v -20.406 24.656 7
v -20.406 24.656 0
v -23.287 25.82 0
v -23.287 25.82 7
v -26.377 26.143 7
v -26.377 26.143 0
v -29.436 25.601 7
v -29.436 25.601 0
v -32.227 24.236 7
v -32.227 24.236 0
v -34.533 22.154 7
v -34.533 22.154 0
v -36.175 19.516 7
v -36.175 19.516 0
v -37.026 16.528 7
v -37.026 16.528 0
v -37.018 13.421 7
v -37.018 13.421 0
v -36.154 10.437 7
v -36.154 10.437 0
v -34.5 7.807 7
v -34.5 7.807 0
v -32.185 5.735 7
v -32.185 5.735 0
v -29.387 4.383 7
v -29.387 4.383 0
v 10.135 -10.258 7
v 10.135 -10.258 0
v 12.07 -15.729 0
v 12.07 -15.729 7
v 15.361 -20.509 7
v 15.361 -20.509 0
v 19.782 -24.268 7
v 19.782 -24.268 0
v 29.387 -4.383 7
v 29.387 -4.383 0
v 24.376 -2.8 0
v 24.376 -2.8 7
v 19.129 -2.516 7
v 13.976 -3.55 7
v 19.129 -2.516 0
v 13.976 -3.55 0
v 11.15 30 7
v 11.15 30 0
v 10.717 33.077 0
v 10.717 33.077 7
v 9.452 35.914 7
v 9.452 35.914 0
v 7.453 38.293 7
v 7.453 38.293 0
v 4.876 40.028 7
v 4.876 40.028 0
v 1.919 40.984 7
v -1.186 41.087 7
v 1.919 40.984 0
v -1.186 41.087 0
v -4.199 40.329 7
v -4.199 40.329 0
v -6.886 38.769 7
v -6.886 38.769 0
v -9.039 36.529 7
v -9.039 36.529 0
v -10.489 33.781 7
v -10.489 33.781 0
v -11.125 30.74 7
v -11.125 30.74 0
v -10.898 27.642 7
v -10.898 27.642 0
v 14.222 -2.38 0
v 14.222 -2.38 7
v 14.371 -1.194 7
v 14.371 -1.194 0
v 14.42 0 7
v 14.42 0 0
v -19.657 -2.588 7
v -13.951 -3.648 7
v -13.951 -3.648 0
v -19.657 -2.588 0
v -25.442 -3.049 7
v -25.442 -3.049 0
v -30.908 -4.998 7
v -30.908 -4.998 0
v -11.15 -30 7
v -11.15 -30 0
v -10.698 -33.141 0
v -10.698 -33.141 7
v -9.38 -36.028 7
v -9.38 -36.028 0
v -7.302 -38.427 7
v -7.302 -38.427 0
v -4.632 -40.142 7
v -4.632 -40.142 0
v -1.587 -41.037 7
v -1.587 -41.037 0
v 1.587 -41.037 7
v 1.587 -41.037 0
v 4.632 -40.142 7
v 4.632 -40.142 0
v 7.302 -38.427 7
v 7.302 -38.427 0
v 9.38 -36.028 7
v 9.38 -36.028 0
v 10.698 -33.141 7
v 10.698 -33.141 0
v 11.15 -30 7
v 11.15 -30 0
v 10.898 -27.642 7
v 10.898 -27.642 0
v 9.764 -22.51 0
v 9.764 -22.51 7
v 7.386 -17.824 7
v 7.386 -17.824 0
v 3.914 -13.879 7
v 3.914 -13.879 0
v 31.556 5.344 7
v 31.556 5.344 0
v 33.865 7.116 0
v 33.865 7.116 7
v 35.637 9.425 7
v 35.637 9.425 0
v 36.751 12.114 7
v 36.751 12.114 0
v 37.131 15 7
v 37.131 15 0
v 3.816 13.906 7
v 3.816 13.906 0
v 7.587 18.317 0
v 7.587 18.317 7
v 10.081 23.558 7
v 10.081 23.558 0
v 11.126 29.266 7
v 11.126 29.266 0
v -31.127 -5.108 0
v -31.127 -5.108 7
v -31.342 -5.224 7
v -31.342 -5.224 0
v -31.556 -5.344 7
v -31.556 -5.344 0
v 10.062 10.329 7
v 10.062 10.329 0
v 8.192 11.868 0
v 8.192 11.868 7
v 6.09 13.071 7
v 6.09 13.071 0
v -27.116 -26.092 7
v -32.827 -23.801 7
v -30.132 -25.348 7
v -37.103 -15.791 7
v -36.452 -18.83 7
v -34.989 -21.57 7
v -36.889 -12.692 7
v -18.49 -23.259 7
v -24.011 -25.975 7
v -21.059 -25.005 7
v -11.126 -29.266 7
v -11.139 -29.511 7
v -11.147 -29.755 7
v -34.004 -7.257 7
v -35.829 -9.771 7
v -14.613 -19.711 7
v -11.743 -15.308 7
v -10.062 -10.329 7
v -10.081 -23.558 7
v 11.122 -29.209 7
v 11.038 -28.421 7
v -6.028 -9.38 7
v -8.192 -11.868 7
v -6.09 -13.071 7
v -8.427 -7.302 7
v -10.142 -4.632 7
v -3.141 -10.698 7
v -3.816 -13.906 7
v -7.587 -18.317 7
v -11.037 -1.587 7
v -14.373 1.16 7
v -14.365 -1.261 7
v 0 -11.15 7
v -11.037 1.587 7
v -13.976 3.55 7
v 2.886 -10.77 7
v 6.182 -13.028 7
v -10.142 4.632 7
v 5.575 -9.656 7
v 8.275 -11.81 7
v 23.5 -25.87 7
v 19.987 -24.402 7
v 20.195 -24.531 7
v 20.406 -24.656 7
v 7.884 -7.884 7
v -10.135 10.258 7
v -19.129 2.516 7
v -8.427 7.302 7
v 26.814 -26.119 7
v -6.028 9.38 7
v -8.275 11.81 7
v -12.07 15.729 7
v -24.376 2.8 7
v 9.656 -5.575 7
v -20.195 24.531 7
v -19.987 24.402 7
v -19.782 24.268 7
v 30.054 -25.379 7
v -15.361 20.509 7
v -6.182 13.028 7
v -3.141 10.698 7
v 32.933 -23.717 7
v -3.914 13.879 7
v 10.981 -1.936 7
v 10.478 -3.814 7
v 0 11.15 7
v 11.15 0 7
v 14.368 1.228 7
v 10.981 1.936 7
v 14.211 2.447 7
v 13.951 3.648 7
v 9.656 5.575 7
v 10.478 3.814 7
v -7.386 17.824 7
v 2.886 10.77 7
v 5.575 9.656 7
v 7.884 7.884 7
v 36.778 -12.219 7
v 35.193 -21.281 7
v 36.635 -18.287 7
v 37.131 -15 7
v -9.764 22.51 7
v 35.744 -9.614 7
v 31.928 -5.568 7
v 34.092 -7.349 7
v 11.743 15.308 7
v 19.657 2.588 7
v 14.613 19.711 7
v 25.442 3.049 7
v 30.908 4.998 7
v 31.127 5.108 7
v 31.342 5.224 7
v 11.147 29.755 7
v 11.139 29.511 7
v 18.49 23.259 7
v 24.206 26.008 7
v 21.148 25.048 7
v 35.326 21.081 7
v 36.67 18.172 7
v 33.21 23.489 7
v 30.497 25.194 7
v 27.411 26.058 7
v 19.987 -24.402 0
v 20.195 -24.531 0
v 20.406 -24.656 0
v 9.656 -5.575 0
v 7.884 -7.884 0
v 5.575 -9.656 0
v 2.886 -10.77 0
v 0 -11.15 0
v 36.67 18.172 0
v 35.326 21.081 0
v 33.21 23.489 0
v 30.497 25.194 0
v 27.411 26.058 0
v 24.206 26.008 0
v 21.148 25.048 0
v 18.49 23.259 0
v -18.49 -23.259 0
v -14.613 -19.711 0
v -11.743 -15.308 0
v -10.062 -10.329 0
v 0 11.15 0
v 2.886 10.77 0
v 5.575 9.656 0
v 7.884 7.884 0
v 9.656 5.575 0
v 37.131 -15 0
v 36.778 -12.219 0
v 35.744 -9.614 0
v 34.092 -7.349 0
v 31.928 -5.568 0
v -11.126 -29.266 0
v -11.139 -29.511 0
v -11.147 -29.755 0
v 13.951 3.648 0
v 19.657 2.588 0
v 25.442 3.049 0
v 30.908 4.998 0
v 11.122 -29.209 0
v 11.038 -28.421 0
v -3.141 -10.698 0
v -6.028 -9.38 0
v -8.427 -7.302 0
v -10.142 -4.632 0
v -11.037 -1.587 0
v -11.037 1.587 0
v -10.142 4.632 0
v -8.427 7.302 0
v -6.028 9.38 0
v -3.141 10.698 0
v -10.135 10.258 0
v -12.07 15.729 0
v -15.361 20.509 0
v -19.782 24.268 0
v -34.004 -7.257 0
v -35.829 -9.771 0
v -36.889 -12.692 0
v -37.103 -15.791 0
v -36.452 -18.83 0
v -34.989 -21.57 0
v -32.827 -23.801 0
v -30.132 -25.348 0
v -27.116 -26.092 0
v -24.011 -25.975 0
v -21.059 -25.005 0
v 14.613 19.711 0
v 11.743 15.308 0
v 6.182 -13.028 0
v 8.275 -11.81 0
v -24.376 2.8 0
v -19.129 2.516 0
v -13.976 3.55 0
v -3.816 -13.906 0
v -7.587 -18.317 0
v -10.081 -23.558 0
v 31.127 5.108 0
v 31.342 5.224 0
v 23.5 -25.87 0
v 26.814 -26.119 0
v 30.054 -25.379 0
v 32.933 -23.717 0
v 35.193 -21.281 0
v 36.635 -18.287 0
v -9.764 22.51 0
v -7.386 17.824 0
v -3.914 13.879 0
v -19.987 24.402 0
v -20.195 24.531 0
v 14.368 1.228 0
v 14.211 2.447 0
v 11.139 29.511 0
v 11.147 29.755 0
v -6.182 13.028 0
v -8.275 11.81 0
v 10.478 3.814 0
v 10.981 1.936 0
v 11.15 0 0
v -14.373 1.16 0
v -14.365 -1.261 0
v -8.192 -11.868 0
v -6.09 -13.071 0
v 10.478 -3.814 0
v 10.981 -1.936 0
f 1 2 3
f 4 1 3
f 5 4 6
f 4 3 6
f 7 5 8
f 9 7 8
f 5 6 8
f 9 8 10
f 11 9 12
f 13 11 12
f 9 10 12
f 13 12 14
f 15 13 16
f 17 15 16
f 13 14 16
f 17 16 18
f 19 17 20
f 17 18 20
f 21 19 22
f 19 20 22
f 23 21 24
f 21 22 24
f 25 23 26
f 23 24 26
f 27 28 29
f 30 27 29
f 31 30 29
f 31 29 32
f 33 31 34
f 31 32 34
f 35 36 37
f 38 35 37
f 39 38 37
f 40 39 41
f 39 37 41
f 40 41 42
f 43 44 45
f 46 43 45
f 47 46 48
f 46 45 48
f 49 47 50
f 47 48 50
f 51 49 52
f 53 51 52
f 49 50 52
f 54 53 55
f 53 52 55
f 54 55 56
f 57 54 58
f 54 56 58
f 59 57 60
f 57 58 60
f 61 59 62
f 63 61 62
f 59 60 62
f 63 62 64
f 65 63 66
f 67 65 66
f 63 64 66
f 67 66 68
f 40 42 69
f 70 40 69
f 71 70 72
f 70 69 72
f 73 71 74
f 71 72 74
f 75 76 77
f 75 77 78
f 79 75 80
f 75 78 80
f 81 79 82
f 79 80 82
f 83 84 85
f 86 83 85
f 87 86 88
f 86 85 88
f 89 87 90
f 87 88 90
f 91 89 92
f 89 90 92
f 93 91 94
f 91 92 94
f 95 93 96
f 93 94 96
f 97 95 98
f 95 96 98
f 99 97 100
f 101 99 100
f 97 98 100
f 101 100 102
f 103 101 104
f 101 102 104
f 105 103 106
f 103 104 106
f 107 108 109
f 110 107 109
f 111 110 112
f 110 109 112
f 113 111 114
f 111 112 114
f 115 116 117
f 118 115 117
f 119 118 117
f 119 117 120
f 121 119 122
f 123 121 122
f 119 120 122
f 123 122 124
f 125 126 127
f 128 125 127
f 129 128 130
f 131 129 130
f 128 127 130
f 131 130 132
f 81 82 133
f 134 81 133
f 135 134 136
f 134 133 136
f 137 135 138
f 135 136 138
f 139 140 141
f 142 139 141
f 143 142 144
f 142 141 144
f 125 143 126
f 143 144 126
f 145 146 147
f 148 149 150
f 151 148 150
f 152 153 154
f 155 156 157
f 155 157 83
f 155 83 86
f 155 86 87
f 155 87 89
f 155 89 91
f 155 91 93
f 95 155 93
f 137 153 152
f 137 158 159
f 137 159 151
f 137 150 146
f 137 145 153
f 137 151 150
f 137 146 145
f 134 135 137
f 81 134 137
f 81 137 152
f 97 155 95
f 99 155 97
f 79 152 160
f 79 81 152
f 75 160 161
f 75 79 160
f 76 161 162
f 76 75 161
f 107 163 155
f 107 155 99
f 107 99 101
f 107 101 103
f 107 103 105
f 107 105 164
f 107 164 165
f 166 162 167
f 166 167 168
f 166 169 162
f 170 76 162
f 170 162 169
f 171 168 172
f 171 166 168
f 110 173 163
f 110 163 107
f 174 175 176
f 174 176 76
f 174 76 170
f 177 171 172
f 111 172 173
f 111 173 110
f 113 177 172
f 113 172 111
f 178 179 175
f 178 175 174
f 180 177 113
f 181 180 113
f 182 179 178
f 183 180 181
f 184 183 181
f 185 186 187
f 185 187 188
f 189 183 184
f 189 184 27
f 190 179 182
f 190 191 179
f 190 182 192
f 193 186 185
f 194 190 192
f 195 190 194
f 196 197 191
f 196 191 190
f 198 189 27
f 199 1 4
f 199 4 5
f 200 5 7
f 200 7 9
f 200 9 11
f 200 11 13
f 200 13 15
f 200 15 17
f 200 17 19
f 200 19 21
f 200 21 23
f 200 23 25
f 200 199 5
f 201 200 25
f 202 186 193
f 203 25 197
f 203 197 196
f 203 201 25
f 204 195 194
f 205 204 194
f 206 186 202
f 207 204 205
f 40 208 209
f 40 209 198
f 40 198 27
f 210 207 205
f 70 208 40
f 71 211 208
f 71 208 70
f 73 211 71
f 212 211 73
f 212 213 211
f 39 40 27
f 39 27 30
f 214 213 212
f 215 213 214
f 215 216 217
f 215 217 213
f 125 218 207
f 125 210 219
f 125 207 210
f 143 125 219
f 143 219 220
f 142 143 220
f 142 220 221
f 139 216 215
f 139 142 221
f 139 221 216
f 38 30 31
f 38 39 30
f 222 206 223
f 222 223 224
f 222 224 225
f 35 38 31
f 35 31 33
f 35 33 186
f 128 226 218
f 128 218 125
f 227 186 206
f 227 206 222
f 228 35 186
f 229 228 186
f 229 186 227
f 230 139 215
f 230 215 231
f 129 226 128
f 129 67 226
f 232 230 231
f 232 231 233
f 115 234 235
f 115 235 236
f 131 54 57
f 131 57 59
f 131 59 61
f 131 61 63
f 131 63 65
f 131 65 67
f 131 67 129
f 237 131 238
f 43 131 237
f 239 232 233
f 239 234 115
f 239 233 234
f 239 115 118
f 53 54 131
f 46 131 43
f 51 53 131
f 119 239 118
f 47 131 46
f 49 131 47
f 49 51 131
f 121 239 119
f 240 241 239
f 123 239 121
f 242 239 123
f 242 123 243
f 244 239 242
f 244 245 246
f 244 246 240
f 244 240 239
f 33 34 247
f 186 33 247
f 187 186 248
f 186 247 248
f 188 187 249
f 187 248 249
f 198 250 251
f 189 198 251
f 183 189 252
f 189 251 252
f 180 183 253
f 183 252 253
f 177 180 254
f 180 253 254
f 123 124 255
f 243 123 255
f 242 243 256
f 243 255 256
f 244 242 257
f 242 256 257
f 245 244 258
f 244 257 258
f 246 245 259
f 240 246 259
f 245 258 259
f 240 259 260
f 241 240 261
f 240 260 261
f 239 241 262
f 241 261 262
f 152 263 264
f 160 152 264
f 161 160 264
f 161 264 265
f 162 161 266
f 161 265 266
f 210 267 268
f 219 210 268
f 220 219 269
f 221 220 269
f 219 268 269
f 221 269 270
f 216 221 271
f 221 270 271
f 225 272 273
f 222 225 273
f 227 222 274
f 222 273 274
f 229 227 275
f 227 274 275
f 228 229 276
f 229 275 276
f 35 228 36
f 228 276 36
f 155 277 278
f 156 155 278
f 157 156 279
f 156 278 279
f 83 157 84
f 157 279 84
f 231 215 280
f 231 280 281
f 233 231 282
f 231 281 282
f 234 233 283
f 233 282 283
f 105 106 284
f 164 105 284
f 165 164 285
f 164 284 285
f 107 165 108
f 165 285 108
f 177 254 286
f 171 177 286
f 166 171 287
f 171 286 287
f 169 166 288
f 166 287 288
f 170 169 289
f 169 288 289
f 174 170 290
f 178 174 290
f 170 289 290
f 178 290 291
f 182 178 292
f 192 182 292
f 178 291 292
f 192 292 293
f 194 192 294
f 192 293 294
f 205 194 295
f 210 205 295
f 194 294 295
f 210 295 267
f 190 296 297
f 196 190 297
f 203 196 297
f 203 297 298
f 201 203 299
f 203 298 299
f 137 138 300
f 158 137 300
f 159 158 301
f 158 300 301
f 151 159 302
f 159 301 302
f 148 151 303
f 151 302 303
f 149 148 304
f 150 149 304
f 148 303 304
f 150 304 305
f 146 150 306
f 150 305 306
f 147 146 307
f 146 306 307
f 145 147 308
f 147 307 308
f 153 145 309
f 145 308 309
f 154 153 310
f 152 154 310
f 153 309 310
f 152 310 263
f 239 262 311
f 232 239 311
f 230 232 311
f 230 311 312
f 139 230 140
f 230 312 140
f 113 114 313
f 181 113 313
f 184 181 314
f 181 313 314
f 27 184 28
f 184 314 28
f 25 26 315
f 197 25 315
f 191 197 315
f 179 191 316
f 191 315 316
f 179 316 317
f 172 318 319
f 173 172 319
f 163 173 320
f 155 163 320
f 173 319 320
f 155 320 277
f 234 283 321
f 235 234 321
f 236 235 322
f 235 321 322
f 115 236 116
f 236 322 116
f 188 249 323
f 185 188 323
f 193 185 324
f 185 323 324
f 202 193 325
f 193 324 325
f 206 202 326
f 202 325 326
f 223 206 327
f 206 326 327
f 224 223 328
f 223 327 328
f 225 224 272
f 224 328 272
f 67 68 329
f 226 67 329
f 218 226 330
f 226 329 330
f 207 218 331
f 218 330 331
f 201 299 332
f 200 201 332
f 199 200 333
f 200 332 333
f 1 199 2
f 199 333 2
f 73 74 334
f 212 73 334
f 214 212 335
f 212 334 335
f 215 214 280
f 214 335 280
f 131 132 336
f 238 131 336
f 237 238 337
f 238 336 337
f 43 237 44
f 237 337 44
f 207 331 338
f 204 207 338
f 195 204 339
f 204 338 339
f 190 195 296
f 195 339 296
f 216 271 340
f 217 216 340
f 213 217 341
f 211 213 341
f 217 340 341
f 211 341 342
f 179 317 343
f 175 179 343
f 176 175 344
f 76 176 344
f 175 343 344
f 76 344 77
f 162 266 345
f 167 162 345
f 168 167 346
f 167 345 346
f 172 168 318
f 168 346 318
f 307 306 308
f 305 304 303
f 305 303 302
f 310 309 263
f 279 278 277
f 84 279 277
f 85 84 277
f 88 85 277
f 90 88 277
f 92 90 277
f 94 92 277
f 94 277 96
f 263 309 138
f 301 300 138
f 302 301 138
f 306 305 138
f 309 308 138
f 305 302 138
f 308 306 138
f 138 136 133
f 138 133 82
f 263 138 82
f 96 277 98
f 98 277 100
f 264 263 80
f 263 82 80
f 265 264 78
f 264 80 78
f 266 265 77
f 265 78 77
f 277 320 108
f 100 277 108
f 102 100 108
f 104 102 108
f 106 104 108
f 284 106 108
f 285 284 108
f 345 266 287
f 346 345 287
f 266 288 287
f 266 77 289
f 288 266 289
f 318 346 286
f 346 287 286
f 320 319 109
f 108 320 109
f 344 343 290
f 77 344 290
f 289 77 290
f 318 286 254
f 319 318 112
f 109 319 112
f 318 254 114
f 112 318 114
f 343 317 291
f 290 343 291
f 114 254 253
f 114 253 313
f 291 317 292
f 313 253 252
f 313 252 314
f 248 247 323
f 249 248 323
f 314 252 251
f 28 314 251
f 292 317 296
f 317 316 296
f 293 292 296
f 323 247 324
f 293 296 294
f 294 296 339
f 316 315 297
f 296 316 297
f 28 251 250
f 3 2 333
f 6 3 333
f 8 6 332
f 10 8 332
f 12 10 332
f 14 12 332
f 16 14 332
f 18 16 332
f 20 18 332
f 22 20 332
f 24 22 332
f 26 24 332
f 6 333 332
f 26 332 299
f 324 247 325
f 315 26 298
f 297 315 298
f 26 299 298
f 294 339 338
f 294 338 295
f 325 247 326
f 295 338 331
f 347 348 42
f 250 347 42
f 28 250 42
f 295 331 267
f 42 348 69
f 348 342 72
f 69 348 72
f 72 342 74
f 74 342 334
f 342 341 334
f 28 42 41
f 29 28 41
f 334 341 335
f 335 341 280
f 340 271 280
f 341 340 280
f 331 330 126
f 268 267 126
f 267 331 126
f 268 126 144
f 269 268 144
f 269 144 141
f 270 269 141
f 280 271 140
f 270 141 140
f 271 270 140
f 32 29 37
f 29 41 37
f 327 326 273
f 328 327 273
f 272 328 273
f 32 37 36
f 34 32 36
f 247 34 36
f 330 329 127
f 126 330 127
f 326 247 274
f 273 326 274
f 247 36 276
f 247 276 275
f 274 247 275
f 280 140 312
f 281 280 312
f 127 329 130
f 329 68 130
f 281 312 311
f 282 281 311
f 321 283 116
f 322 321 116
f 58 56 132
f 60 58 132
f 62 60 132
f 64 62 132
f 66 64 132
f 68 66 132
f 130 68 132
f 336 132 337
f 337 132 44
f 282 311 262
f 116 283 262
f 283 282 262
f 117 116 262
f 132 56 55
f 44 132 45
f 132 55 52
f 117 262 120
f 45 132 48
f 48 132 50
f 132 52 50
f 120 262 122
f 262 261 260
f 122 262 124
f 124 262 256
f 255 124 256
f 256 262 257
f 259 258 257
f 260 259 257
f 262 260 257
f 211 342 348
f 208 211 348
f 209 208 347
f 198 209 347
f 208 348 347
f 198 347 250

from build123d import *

# Parameters (mm, degrees)
F1_DEPTH = 7


with BuildPart() as f1:
    # F0 (on Top) → F1 (new body)
    with BuildSketch(Plane.XY):
        with BuildLine():
            ThreePointArc((9.6561832522, 5.575), (10.7700729631, 2.8858323529), (11.15, 0))
            ThreePointArc((11.15, 0), (10.7700729631, -2.8858323529), (9.6561832522, -5.575))
            ThreePointArc((9.6561832522, -5.575), (11.7583450993, -4.4386309052), (13.9764549062, -3.549581955))
            ThreePointArc((13.9764549062, -3.549581955), (14.308798821, -1.7886028346), (14.4201533903, 0))
            ThreePointArc((14.4201533903, 0), (14.3024193489, 1.8389194019), (13.9511397154, 3.6478109107))
            ThreePointArc((13.9511397154, 3.6478109107), (11.7522539794, 4.4968380812), (9.6561832522, 5.575))
        make_face()
        with BuildLine():
            ThreePointArc((10.0622555989, 10.3291740261), (9.7231396716, 7.9637101099), (9.6561832522, 5.575))
            ThreePointArc((9.6561832522, 5.575), (11.7522539794, 4.4968380812), (13.9511397154, 3.6478109107))
            ThreePointArc((13.9511397154, 3.6478109107), (12.4627822697, 7.2539562928), (10.0622555989, 10.3291740261))
        make_face()
        with BuildLine():
            ThreePointArc((0, 11.15), (5.575, 9.6561832522), (9.6561832522, 5.575))
            ThreePointArc((9.6561832522, 5.575), (9.7231396716, 7.9637101099), (10.0622555989, 10.3291740261))
            ThreePointArc((10.0622555989, 10.3291740261), (7.1661079009, 12.5135015624), (3.8164729409, 13.9059468606))
            ThreePointArc((3.8164729409, 13.9059468606), (1.9817509747, 12.4261695385), (0, 11.15))
        make_face()
        with BuildLine():
            ThreePointArc((10.1346667746, -10.25813595), (9.7705030047, -7.9293314573), (9.6561832522, -5.575))
            ThreePointArc((9.6561832522, -5.575), (5.575, -9.6561832522), (0, -11.15))
            ThreePointArc((0, -11.15), (2.0352054277, -12.4023410151), (3.9141993072, -13.8787559811))
            ThreePointArc((3.9141993072, -13.8787559811), (7.2539562928, -12.4627822697), (10.1346667746, -10.25813595))
        make_face()
        with BuildLine():
            ThreePointArc((13.9764549062, -3.549581955), (11.7583450993, -4.4386309052), (9.6561832522, -5.575))
            ThreePointArc((9.6561832522, -5.575), (9.7705030047, -7.9293314573), (10.1346667746, -10.25813595))
            ThreePointArc((10.1346667746, -10.25813595), (12.5135015624, -7.1661079009), (13.9764549062, -3.549581955))
        make_face()
        with BuildLine():
            ThreePointArc((-3.9141993072, 13.8787559811), (-2.0352054277, 12.4023410151), (0, 11.15))
            ThreePointArc((0, 11.15), (1.9817509747, 12.4261695385), (3.8164729409, 13.9059468606))
            ThreePointArc((3.8164729409, 13.9059468606), (-0.0507192927, 14.4200641938), (-3.9141993072, 13.8787559811))
        make_face()
        with BuildLine():
            ThreePointArc((-9.6561832522, 5.575), (-5.575, 9.6561832522), (0, 11.15))
            ThreePointArc((0, 11.15), (-2.0352054277, 12.4023410151), (-3.9141993072, 13.8787559811))
            ThreePointArc((-3.9141993072, 13.8787559811), (-7.2539562928, 12.4627822697), (-10.1346667746, 10.25813595))
            ThreePointArc((-10.1346667746, 10.25813595), (-9.7705030047, 7.9293314573), (-9.6561832522, 5.575))
        make_face()
        with BuildLine():
            ThreePointArc((10.0622555989, 10.3291740261), (12.4627822697, 7.2539562928), (13.9511397154, 3.6478109107))
            ThreePointArc((13.9511397154, 3.6478109107), (22.5646732179, 2.6278419368), (30.9082990141, 4.9979062145))
            ThreePointArc((30.9082990141, 4.9979062145), (16.7608876912, 8.7297196525), (18.4895315816, 23.2585691931))
            ThreePointArc((18.4895315816, 23.2585691931), (13.039109397, 17.5999976189), (10.0622555989, 10.3291740261))
        make_face()
        with BuildLine():
            ThreePointArc((-3.8164729409, -13.9059468606), (-1.9817509747, -12.4261695385), (0, -11.15))
            ThreePointArc((0, -11.15), (-5.575, -9.6561832522), (-9.6561832522, -5.575))
            ThreePointArc((-9.6561832522, -5.575), (-9.7231396716, -7.9637101099), (-10.0622555989, -10.3291740261))
            ThreePointArc((-10.0622555989, -10.3291740261), (-7.1661079009, -12.5135015624), (-3.8164729409, -13.9059468606))
        make_face()
        with BuildLine():
            ThreePointArc((3.9141993072, -13.8787559811), (2.0352054277, -12.4023410151), (0, -11.15))
            ThreePointArc((0, -11.15), (-1.9817509747, -12.4261695385), (-3.8164729409, -13.9059468606))
            ThreePointArc((-3.8164729409, -13.9059468606), (0.0507192927, -14.4200641938), (3.9141993072, -13.8787559811))
        make_face()
        with BuildLine():
            ThreePointArc((13.9764549062, -3.549581955), (12.5135015624, -7.1661079009), (10.1346667746, -10.25813595))
            ThreePointArc((10.1346667746, -10.25813595), (13.5581144833, -18.2276592665), (19.7824632545, -24.2684190267))
            ThreePointArc((19.7824632545, -24.2684190267), (15.9406028326, -10.1504947043), (29.3872775678, -4.3831194572))
            ThreePointArc((29.3872775678, -4.3831194572), (21.761599743, -2.4922011711), (13.9764549062, -3.549581955))
        make_face()
        with BuildLine():
            ThreePointArc((-13.9764549062, 3.549581955), (-11.7583450993, 4.4386309052), (-9.6561832522, 5.575))
            ThreePointArc((-9.6561832522, 5.575), (-9.7705030047, 7.9293314573), (-10.1346667746, 10.25813595))
            ThreePointArc((-10.1346667746, 10.25813595), (-12.5135015624, 7.1661079009), (-13.9764549062, 3.549581955))
        make_face()
        with BuildLine():
            ThreePointArc((-9.6561832522, -5.575), (-11.15, 0), (-9.6561832522, 5.575))
            ThreePointArc((-9.6561832522, 5.575), (-11.7583450993, 4.4386309052), (-13.9764549062, 3.549581955))
            ThreePointArc((-13.9764549062, 3.549581955), (-14.4200641938, -0.0507192927), (-13.9511397154, -3.6478109107))
            ThreePointArc((-13.9511397154, -3.6478109107), (-11.7522539794, -4.4968380812), (-9.6561832522, -5.575))
        make_face()
        with BuildLine():
            ThreePointArc((-3.9141993072, 13.8787559811), (-0.0507192927, 14.4200641938), (3.8164729409, 13.9059468606))
            ThreePointArc((3.8164729409, 13.9059468606), (9.0065587346, 20.8555012032), (11.1258357595, 29.2663252412))
            ThreePointArc((11.1258357595, 29.2663252412), (0.8202848586, 18.8802143568), (-10.8977459861, 27.6416886503))
            ThreePointArc((-10.8977459861, 27.6416886503), (-8.722490346, 20.0921987899), (-3.9141993072, 13.8787559811))
        make_face()
        with BuildLine():
            ThreePointArc((31.5557621135, 5.3438167478), (31.2334654211, 5.168175766), (30.9082990141, 4.9979062145))
            ThreePointArc((30.9082990141, 4.9979062145), (31.2348780107, 5.1655317307), (31.5557621135, 5.3438167478))
        make_face()
        with BuildLine():
            ThreePointArc((18.4895315816, 23.2585691931), (16.7608876912, 8.7297196525), (30.9082990141, 4.9979062145))
            ThreePointArc((30.9082990141, 4.9979062145), (31.2334654211, 5.168175766), (31.5557621135, 5.3438167478))
            ThreePointArc((31.5557621135, 5.3438167478), (35.6369453657, 9.425), (37.1307621135, 15))
            ThreePointArc((37.1307621135, 15), (30.497136742, 25.1943543305), (18.4895315816, 23.2585691931))
        make_face()
        with BuildLine():
            ThreePointArc((-10.0622555989, -10.3291740261), (-9.7231396716, -7.9637101099), (-9.6561832522, -5.575))
            ThreePointArc((-9.6561832522, -5.575), (-11.7522539794, -4.4968380812), (-13.9511397154, -3.6478109107))
            ThreePointArc((-13.9511397154, -3.6478109107), (-12.4627822697, -7.2539562928), (-10.0622555989, -10.3291740261))
        make_face()
        with BuildLine():
            ThreePointArc((3.9141993072, -13.8787559811), (0.0507192927, -14.4200641938), (-3.8164729409, -13.9059468606))
            ThreePointArc((-3.8164729409, -13.9059468606), (-9.0065587346, -20.8555012032), (-11.1258357595, -29.2663252412))
            ThreePointArc((-11.1258357595, -29.2663252412), (-0.8202848586, -18.8802143568), (10.8977459861, -27.6416886503))
            ThreePointArc((10.8977459861, -27.6416886503), (8.722490346, -20.0921987899), (3.9141993072, -13.8787559811))
        make_face()
        with BuildLine():
            ThreePointArc((20.4057621135, -24.6561832522), (20.0925042151, -24.4648866199), (19.7824632545, -24.2684190267))
            ThreePointArc((19.7824632545, -24.2684190267), (20.0909207082, -24.467431976), (20.4057621135, -24.6561832522))
        make_face()
        with BuildLine():
            ThreePointArc((29.3872775678, -4.3831194572), (15.9406028326, -10.1504947043), (19.7824632545, -24.2684190267))
            ThreePointArc((19.7824632545, -24.2684190267), (20.0925042151, -24.4648866199), (20.4057621135, -24.6561832522))
            ThreePointArc((20.4057621135, -24.6561832522), (31.5557621135, -24.6561832522), (37.1307621135, -15))
            ThreePointArc((37.1307621135, -15), (34.98923444, -8.4296174889), (29.3872775678, -4.3831194572))
        make_face()
        with BuildLine():
            ThreePointArc((-13.9764549062, 3.549581955), (-12.5135015624, 7.1661079009), (-10.1346667746, 10.25813595))
            ThreePointArc((-10.1346667746, 10.25813595), (-13.5581144833, 18.2276592665), (-19.7824632545, 24.2684190267))
            ThreePointArc((-19.7824632545, 24.2684190267), (-16.1462938443, 20.2541158972), (-14.8307621135, 15))
            ThreePointArc((-14.8307621135, 15), (-19.4103796024, 5.9915276735), (-29.3872775678, 4.3831194572))
            ThreePointArc((-29.3872775678, 4.3831194572), (-21.761599743, 2.4922011711), (-13.9764549062, 3.549581955))
        make_face()
        with BuildLine():
            ThreePointArc((11.15, 30), (11.140961206, 29.6330623859), (11.1258357595, 29.2663252412))
            ThreePointArc((11.1258357595, 29.2663252412), (11.1439573025, 29.6329637068), (11.15, 30))
        make_face()
        with BuildLine():
            ThreePointArc((-10.8977459861, 27.6416886503), (0.8202848586, 18.8802143568), (11.1258357595, 29.2663252412))
            ThreePointArc((11.1258357595, 29.2663252412), (11.140961206, 29.6330623859), (11.15, 30))
            ThreePointArc((11.15, 30), (-1.185882004, 41.0867571396), (-10.8977459861, 27.6416886503))
        make_face()
        with BuildLine():
            ThreePointArc((-10.0622555989, -10.3291740261), (-12.4627822697, -7.2539562928), (-13.9511397154, -3.6478109107))
            ThreePointArc((-13.9511397154, -3.6478109107), (-22.5646732179, -2.6278419368), (-30.9082990141, -4.9979062145))
            ThreePointArc((-30.9082990141, -4.9979062145), (-20.0909207082, -5.532568024), (-14.8307621135, -15))
            ThreePointArc((-14.8307621135, -15), (-15.7864077831, -19.5163746285), (-18.4895315816, -23.2585691931))
            ThreePointArc((-18.4895315816, -23.2585691931), (-13.039109397, -17.5999976189), (-10.0622555989, -10.3291740261))
        make_face()
        with BuildLine():
            ThreePointArc((-11.15, -30), (-11.140961206, -29.6330623859), (-11.1258357595, -29.2663252412))
            ThreePointArc((-11.1258357595, -29.2663252412), (-11.1439573025, -29.6329637068), (-11.15, -30))
        make_face()
        with BuildLine():
            ThreePointArc((10.8977459861, -27.6416886503), (-0.8202848586, -18.8802143568), (-11.1258357595, -29.2663252412))
            ThreePointArc((-11.1258357595, -29.2663252412), (-11.140961206, -29.6330623859), (-11.15, -30))
            ThreePointArc((-11.15, -30), (0, -41.15), (11.15, -30))
            ThreePointArc((11.15, -30), (11.0867571396, -28.814117996), (10.8977459861, -27.6416886503))
        make_face()
        with BuildLine():
            ThreePointArc((-20.4057621135, 24.6561832522), (-20.0925042151, 24.4648866199), (-19.7824632545, 24.2684190267))
            ThreePointArc((-19.7824632545, 24.2684190267), (-20.0909207082, 24.467431976), (-20.4057621135, 24.6561832522))
        make_face()
        with BuildLine():
            ThreePointArc((-14.8307621135, 15), (-16.1462938443, 20.2541158972), (-19.7824632545, 24.2684190267))
            ThreePointArc((-19.7824632545, 24.2684190267), (-20.0925042151, 24.4648866199), (-20.4057621135, 24.6561832522))
            ThreePointArc((-20.4057621135, 24.6561832522), (-36.175116444, 19.5163746285), (-29.3872775678, 4.3831194572))
            ThreePointArc((-29.3872775678, 4.3831194572), (-19.4103796024, 5.9915276735), (-14.8307621135, 15))
        make_face()
        with BuildLine():
            ThreePointArc((-31.5557621135, -5.3438167478), (-31.2334654211, -5.168175766), (-30.9082990141, -4.9979062145))
            ThreePointArc((-30.9082990141, -4.9979062145), (-31.2348780107, -5.1655317307), (-31.5557621135, -5.3438167478))
        make_face()
        with BuildLine():
            ThreePointArc((-14.8307621135, -15), (-20.0909207082, -5.532568024), (-30.9082990141, -4.9979062145))
            ThreePointArc((-30.9082990141, -4.9979062145), (-31.2334654211, -5.168175766), (-31.5557621135, -5.3438167478))
            ThreePointArc((-31.5557621135, -5.3438167478), (-34.98923444, -21.5703825111), (-18.4895315816, -23.2585691931))
            ThreePointArc((-18.4895315816, -23.2585691931), (-15.7864077831, -19.5163746285), (-14.8307621135, -15))
        make_face()
    extrude(amount=F1_DEPTH)


solid = f1.part
